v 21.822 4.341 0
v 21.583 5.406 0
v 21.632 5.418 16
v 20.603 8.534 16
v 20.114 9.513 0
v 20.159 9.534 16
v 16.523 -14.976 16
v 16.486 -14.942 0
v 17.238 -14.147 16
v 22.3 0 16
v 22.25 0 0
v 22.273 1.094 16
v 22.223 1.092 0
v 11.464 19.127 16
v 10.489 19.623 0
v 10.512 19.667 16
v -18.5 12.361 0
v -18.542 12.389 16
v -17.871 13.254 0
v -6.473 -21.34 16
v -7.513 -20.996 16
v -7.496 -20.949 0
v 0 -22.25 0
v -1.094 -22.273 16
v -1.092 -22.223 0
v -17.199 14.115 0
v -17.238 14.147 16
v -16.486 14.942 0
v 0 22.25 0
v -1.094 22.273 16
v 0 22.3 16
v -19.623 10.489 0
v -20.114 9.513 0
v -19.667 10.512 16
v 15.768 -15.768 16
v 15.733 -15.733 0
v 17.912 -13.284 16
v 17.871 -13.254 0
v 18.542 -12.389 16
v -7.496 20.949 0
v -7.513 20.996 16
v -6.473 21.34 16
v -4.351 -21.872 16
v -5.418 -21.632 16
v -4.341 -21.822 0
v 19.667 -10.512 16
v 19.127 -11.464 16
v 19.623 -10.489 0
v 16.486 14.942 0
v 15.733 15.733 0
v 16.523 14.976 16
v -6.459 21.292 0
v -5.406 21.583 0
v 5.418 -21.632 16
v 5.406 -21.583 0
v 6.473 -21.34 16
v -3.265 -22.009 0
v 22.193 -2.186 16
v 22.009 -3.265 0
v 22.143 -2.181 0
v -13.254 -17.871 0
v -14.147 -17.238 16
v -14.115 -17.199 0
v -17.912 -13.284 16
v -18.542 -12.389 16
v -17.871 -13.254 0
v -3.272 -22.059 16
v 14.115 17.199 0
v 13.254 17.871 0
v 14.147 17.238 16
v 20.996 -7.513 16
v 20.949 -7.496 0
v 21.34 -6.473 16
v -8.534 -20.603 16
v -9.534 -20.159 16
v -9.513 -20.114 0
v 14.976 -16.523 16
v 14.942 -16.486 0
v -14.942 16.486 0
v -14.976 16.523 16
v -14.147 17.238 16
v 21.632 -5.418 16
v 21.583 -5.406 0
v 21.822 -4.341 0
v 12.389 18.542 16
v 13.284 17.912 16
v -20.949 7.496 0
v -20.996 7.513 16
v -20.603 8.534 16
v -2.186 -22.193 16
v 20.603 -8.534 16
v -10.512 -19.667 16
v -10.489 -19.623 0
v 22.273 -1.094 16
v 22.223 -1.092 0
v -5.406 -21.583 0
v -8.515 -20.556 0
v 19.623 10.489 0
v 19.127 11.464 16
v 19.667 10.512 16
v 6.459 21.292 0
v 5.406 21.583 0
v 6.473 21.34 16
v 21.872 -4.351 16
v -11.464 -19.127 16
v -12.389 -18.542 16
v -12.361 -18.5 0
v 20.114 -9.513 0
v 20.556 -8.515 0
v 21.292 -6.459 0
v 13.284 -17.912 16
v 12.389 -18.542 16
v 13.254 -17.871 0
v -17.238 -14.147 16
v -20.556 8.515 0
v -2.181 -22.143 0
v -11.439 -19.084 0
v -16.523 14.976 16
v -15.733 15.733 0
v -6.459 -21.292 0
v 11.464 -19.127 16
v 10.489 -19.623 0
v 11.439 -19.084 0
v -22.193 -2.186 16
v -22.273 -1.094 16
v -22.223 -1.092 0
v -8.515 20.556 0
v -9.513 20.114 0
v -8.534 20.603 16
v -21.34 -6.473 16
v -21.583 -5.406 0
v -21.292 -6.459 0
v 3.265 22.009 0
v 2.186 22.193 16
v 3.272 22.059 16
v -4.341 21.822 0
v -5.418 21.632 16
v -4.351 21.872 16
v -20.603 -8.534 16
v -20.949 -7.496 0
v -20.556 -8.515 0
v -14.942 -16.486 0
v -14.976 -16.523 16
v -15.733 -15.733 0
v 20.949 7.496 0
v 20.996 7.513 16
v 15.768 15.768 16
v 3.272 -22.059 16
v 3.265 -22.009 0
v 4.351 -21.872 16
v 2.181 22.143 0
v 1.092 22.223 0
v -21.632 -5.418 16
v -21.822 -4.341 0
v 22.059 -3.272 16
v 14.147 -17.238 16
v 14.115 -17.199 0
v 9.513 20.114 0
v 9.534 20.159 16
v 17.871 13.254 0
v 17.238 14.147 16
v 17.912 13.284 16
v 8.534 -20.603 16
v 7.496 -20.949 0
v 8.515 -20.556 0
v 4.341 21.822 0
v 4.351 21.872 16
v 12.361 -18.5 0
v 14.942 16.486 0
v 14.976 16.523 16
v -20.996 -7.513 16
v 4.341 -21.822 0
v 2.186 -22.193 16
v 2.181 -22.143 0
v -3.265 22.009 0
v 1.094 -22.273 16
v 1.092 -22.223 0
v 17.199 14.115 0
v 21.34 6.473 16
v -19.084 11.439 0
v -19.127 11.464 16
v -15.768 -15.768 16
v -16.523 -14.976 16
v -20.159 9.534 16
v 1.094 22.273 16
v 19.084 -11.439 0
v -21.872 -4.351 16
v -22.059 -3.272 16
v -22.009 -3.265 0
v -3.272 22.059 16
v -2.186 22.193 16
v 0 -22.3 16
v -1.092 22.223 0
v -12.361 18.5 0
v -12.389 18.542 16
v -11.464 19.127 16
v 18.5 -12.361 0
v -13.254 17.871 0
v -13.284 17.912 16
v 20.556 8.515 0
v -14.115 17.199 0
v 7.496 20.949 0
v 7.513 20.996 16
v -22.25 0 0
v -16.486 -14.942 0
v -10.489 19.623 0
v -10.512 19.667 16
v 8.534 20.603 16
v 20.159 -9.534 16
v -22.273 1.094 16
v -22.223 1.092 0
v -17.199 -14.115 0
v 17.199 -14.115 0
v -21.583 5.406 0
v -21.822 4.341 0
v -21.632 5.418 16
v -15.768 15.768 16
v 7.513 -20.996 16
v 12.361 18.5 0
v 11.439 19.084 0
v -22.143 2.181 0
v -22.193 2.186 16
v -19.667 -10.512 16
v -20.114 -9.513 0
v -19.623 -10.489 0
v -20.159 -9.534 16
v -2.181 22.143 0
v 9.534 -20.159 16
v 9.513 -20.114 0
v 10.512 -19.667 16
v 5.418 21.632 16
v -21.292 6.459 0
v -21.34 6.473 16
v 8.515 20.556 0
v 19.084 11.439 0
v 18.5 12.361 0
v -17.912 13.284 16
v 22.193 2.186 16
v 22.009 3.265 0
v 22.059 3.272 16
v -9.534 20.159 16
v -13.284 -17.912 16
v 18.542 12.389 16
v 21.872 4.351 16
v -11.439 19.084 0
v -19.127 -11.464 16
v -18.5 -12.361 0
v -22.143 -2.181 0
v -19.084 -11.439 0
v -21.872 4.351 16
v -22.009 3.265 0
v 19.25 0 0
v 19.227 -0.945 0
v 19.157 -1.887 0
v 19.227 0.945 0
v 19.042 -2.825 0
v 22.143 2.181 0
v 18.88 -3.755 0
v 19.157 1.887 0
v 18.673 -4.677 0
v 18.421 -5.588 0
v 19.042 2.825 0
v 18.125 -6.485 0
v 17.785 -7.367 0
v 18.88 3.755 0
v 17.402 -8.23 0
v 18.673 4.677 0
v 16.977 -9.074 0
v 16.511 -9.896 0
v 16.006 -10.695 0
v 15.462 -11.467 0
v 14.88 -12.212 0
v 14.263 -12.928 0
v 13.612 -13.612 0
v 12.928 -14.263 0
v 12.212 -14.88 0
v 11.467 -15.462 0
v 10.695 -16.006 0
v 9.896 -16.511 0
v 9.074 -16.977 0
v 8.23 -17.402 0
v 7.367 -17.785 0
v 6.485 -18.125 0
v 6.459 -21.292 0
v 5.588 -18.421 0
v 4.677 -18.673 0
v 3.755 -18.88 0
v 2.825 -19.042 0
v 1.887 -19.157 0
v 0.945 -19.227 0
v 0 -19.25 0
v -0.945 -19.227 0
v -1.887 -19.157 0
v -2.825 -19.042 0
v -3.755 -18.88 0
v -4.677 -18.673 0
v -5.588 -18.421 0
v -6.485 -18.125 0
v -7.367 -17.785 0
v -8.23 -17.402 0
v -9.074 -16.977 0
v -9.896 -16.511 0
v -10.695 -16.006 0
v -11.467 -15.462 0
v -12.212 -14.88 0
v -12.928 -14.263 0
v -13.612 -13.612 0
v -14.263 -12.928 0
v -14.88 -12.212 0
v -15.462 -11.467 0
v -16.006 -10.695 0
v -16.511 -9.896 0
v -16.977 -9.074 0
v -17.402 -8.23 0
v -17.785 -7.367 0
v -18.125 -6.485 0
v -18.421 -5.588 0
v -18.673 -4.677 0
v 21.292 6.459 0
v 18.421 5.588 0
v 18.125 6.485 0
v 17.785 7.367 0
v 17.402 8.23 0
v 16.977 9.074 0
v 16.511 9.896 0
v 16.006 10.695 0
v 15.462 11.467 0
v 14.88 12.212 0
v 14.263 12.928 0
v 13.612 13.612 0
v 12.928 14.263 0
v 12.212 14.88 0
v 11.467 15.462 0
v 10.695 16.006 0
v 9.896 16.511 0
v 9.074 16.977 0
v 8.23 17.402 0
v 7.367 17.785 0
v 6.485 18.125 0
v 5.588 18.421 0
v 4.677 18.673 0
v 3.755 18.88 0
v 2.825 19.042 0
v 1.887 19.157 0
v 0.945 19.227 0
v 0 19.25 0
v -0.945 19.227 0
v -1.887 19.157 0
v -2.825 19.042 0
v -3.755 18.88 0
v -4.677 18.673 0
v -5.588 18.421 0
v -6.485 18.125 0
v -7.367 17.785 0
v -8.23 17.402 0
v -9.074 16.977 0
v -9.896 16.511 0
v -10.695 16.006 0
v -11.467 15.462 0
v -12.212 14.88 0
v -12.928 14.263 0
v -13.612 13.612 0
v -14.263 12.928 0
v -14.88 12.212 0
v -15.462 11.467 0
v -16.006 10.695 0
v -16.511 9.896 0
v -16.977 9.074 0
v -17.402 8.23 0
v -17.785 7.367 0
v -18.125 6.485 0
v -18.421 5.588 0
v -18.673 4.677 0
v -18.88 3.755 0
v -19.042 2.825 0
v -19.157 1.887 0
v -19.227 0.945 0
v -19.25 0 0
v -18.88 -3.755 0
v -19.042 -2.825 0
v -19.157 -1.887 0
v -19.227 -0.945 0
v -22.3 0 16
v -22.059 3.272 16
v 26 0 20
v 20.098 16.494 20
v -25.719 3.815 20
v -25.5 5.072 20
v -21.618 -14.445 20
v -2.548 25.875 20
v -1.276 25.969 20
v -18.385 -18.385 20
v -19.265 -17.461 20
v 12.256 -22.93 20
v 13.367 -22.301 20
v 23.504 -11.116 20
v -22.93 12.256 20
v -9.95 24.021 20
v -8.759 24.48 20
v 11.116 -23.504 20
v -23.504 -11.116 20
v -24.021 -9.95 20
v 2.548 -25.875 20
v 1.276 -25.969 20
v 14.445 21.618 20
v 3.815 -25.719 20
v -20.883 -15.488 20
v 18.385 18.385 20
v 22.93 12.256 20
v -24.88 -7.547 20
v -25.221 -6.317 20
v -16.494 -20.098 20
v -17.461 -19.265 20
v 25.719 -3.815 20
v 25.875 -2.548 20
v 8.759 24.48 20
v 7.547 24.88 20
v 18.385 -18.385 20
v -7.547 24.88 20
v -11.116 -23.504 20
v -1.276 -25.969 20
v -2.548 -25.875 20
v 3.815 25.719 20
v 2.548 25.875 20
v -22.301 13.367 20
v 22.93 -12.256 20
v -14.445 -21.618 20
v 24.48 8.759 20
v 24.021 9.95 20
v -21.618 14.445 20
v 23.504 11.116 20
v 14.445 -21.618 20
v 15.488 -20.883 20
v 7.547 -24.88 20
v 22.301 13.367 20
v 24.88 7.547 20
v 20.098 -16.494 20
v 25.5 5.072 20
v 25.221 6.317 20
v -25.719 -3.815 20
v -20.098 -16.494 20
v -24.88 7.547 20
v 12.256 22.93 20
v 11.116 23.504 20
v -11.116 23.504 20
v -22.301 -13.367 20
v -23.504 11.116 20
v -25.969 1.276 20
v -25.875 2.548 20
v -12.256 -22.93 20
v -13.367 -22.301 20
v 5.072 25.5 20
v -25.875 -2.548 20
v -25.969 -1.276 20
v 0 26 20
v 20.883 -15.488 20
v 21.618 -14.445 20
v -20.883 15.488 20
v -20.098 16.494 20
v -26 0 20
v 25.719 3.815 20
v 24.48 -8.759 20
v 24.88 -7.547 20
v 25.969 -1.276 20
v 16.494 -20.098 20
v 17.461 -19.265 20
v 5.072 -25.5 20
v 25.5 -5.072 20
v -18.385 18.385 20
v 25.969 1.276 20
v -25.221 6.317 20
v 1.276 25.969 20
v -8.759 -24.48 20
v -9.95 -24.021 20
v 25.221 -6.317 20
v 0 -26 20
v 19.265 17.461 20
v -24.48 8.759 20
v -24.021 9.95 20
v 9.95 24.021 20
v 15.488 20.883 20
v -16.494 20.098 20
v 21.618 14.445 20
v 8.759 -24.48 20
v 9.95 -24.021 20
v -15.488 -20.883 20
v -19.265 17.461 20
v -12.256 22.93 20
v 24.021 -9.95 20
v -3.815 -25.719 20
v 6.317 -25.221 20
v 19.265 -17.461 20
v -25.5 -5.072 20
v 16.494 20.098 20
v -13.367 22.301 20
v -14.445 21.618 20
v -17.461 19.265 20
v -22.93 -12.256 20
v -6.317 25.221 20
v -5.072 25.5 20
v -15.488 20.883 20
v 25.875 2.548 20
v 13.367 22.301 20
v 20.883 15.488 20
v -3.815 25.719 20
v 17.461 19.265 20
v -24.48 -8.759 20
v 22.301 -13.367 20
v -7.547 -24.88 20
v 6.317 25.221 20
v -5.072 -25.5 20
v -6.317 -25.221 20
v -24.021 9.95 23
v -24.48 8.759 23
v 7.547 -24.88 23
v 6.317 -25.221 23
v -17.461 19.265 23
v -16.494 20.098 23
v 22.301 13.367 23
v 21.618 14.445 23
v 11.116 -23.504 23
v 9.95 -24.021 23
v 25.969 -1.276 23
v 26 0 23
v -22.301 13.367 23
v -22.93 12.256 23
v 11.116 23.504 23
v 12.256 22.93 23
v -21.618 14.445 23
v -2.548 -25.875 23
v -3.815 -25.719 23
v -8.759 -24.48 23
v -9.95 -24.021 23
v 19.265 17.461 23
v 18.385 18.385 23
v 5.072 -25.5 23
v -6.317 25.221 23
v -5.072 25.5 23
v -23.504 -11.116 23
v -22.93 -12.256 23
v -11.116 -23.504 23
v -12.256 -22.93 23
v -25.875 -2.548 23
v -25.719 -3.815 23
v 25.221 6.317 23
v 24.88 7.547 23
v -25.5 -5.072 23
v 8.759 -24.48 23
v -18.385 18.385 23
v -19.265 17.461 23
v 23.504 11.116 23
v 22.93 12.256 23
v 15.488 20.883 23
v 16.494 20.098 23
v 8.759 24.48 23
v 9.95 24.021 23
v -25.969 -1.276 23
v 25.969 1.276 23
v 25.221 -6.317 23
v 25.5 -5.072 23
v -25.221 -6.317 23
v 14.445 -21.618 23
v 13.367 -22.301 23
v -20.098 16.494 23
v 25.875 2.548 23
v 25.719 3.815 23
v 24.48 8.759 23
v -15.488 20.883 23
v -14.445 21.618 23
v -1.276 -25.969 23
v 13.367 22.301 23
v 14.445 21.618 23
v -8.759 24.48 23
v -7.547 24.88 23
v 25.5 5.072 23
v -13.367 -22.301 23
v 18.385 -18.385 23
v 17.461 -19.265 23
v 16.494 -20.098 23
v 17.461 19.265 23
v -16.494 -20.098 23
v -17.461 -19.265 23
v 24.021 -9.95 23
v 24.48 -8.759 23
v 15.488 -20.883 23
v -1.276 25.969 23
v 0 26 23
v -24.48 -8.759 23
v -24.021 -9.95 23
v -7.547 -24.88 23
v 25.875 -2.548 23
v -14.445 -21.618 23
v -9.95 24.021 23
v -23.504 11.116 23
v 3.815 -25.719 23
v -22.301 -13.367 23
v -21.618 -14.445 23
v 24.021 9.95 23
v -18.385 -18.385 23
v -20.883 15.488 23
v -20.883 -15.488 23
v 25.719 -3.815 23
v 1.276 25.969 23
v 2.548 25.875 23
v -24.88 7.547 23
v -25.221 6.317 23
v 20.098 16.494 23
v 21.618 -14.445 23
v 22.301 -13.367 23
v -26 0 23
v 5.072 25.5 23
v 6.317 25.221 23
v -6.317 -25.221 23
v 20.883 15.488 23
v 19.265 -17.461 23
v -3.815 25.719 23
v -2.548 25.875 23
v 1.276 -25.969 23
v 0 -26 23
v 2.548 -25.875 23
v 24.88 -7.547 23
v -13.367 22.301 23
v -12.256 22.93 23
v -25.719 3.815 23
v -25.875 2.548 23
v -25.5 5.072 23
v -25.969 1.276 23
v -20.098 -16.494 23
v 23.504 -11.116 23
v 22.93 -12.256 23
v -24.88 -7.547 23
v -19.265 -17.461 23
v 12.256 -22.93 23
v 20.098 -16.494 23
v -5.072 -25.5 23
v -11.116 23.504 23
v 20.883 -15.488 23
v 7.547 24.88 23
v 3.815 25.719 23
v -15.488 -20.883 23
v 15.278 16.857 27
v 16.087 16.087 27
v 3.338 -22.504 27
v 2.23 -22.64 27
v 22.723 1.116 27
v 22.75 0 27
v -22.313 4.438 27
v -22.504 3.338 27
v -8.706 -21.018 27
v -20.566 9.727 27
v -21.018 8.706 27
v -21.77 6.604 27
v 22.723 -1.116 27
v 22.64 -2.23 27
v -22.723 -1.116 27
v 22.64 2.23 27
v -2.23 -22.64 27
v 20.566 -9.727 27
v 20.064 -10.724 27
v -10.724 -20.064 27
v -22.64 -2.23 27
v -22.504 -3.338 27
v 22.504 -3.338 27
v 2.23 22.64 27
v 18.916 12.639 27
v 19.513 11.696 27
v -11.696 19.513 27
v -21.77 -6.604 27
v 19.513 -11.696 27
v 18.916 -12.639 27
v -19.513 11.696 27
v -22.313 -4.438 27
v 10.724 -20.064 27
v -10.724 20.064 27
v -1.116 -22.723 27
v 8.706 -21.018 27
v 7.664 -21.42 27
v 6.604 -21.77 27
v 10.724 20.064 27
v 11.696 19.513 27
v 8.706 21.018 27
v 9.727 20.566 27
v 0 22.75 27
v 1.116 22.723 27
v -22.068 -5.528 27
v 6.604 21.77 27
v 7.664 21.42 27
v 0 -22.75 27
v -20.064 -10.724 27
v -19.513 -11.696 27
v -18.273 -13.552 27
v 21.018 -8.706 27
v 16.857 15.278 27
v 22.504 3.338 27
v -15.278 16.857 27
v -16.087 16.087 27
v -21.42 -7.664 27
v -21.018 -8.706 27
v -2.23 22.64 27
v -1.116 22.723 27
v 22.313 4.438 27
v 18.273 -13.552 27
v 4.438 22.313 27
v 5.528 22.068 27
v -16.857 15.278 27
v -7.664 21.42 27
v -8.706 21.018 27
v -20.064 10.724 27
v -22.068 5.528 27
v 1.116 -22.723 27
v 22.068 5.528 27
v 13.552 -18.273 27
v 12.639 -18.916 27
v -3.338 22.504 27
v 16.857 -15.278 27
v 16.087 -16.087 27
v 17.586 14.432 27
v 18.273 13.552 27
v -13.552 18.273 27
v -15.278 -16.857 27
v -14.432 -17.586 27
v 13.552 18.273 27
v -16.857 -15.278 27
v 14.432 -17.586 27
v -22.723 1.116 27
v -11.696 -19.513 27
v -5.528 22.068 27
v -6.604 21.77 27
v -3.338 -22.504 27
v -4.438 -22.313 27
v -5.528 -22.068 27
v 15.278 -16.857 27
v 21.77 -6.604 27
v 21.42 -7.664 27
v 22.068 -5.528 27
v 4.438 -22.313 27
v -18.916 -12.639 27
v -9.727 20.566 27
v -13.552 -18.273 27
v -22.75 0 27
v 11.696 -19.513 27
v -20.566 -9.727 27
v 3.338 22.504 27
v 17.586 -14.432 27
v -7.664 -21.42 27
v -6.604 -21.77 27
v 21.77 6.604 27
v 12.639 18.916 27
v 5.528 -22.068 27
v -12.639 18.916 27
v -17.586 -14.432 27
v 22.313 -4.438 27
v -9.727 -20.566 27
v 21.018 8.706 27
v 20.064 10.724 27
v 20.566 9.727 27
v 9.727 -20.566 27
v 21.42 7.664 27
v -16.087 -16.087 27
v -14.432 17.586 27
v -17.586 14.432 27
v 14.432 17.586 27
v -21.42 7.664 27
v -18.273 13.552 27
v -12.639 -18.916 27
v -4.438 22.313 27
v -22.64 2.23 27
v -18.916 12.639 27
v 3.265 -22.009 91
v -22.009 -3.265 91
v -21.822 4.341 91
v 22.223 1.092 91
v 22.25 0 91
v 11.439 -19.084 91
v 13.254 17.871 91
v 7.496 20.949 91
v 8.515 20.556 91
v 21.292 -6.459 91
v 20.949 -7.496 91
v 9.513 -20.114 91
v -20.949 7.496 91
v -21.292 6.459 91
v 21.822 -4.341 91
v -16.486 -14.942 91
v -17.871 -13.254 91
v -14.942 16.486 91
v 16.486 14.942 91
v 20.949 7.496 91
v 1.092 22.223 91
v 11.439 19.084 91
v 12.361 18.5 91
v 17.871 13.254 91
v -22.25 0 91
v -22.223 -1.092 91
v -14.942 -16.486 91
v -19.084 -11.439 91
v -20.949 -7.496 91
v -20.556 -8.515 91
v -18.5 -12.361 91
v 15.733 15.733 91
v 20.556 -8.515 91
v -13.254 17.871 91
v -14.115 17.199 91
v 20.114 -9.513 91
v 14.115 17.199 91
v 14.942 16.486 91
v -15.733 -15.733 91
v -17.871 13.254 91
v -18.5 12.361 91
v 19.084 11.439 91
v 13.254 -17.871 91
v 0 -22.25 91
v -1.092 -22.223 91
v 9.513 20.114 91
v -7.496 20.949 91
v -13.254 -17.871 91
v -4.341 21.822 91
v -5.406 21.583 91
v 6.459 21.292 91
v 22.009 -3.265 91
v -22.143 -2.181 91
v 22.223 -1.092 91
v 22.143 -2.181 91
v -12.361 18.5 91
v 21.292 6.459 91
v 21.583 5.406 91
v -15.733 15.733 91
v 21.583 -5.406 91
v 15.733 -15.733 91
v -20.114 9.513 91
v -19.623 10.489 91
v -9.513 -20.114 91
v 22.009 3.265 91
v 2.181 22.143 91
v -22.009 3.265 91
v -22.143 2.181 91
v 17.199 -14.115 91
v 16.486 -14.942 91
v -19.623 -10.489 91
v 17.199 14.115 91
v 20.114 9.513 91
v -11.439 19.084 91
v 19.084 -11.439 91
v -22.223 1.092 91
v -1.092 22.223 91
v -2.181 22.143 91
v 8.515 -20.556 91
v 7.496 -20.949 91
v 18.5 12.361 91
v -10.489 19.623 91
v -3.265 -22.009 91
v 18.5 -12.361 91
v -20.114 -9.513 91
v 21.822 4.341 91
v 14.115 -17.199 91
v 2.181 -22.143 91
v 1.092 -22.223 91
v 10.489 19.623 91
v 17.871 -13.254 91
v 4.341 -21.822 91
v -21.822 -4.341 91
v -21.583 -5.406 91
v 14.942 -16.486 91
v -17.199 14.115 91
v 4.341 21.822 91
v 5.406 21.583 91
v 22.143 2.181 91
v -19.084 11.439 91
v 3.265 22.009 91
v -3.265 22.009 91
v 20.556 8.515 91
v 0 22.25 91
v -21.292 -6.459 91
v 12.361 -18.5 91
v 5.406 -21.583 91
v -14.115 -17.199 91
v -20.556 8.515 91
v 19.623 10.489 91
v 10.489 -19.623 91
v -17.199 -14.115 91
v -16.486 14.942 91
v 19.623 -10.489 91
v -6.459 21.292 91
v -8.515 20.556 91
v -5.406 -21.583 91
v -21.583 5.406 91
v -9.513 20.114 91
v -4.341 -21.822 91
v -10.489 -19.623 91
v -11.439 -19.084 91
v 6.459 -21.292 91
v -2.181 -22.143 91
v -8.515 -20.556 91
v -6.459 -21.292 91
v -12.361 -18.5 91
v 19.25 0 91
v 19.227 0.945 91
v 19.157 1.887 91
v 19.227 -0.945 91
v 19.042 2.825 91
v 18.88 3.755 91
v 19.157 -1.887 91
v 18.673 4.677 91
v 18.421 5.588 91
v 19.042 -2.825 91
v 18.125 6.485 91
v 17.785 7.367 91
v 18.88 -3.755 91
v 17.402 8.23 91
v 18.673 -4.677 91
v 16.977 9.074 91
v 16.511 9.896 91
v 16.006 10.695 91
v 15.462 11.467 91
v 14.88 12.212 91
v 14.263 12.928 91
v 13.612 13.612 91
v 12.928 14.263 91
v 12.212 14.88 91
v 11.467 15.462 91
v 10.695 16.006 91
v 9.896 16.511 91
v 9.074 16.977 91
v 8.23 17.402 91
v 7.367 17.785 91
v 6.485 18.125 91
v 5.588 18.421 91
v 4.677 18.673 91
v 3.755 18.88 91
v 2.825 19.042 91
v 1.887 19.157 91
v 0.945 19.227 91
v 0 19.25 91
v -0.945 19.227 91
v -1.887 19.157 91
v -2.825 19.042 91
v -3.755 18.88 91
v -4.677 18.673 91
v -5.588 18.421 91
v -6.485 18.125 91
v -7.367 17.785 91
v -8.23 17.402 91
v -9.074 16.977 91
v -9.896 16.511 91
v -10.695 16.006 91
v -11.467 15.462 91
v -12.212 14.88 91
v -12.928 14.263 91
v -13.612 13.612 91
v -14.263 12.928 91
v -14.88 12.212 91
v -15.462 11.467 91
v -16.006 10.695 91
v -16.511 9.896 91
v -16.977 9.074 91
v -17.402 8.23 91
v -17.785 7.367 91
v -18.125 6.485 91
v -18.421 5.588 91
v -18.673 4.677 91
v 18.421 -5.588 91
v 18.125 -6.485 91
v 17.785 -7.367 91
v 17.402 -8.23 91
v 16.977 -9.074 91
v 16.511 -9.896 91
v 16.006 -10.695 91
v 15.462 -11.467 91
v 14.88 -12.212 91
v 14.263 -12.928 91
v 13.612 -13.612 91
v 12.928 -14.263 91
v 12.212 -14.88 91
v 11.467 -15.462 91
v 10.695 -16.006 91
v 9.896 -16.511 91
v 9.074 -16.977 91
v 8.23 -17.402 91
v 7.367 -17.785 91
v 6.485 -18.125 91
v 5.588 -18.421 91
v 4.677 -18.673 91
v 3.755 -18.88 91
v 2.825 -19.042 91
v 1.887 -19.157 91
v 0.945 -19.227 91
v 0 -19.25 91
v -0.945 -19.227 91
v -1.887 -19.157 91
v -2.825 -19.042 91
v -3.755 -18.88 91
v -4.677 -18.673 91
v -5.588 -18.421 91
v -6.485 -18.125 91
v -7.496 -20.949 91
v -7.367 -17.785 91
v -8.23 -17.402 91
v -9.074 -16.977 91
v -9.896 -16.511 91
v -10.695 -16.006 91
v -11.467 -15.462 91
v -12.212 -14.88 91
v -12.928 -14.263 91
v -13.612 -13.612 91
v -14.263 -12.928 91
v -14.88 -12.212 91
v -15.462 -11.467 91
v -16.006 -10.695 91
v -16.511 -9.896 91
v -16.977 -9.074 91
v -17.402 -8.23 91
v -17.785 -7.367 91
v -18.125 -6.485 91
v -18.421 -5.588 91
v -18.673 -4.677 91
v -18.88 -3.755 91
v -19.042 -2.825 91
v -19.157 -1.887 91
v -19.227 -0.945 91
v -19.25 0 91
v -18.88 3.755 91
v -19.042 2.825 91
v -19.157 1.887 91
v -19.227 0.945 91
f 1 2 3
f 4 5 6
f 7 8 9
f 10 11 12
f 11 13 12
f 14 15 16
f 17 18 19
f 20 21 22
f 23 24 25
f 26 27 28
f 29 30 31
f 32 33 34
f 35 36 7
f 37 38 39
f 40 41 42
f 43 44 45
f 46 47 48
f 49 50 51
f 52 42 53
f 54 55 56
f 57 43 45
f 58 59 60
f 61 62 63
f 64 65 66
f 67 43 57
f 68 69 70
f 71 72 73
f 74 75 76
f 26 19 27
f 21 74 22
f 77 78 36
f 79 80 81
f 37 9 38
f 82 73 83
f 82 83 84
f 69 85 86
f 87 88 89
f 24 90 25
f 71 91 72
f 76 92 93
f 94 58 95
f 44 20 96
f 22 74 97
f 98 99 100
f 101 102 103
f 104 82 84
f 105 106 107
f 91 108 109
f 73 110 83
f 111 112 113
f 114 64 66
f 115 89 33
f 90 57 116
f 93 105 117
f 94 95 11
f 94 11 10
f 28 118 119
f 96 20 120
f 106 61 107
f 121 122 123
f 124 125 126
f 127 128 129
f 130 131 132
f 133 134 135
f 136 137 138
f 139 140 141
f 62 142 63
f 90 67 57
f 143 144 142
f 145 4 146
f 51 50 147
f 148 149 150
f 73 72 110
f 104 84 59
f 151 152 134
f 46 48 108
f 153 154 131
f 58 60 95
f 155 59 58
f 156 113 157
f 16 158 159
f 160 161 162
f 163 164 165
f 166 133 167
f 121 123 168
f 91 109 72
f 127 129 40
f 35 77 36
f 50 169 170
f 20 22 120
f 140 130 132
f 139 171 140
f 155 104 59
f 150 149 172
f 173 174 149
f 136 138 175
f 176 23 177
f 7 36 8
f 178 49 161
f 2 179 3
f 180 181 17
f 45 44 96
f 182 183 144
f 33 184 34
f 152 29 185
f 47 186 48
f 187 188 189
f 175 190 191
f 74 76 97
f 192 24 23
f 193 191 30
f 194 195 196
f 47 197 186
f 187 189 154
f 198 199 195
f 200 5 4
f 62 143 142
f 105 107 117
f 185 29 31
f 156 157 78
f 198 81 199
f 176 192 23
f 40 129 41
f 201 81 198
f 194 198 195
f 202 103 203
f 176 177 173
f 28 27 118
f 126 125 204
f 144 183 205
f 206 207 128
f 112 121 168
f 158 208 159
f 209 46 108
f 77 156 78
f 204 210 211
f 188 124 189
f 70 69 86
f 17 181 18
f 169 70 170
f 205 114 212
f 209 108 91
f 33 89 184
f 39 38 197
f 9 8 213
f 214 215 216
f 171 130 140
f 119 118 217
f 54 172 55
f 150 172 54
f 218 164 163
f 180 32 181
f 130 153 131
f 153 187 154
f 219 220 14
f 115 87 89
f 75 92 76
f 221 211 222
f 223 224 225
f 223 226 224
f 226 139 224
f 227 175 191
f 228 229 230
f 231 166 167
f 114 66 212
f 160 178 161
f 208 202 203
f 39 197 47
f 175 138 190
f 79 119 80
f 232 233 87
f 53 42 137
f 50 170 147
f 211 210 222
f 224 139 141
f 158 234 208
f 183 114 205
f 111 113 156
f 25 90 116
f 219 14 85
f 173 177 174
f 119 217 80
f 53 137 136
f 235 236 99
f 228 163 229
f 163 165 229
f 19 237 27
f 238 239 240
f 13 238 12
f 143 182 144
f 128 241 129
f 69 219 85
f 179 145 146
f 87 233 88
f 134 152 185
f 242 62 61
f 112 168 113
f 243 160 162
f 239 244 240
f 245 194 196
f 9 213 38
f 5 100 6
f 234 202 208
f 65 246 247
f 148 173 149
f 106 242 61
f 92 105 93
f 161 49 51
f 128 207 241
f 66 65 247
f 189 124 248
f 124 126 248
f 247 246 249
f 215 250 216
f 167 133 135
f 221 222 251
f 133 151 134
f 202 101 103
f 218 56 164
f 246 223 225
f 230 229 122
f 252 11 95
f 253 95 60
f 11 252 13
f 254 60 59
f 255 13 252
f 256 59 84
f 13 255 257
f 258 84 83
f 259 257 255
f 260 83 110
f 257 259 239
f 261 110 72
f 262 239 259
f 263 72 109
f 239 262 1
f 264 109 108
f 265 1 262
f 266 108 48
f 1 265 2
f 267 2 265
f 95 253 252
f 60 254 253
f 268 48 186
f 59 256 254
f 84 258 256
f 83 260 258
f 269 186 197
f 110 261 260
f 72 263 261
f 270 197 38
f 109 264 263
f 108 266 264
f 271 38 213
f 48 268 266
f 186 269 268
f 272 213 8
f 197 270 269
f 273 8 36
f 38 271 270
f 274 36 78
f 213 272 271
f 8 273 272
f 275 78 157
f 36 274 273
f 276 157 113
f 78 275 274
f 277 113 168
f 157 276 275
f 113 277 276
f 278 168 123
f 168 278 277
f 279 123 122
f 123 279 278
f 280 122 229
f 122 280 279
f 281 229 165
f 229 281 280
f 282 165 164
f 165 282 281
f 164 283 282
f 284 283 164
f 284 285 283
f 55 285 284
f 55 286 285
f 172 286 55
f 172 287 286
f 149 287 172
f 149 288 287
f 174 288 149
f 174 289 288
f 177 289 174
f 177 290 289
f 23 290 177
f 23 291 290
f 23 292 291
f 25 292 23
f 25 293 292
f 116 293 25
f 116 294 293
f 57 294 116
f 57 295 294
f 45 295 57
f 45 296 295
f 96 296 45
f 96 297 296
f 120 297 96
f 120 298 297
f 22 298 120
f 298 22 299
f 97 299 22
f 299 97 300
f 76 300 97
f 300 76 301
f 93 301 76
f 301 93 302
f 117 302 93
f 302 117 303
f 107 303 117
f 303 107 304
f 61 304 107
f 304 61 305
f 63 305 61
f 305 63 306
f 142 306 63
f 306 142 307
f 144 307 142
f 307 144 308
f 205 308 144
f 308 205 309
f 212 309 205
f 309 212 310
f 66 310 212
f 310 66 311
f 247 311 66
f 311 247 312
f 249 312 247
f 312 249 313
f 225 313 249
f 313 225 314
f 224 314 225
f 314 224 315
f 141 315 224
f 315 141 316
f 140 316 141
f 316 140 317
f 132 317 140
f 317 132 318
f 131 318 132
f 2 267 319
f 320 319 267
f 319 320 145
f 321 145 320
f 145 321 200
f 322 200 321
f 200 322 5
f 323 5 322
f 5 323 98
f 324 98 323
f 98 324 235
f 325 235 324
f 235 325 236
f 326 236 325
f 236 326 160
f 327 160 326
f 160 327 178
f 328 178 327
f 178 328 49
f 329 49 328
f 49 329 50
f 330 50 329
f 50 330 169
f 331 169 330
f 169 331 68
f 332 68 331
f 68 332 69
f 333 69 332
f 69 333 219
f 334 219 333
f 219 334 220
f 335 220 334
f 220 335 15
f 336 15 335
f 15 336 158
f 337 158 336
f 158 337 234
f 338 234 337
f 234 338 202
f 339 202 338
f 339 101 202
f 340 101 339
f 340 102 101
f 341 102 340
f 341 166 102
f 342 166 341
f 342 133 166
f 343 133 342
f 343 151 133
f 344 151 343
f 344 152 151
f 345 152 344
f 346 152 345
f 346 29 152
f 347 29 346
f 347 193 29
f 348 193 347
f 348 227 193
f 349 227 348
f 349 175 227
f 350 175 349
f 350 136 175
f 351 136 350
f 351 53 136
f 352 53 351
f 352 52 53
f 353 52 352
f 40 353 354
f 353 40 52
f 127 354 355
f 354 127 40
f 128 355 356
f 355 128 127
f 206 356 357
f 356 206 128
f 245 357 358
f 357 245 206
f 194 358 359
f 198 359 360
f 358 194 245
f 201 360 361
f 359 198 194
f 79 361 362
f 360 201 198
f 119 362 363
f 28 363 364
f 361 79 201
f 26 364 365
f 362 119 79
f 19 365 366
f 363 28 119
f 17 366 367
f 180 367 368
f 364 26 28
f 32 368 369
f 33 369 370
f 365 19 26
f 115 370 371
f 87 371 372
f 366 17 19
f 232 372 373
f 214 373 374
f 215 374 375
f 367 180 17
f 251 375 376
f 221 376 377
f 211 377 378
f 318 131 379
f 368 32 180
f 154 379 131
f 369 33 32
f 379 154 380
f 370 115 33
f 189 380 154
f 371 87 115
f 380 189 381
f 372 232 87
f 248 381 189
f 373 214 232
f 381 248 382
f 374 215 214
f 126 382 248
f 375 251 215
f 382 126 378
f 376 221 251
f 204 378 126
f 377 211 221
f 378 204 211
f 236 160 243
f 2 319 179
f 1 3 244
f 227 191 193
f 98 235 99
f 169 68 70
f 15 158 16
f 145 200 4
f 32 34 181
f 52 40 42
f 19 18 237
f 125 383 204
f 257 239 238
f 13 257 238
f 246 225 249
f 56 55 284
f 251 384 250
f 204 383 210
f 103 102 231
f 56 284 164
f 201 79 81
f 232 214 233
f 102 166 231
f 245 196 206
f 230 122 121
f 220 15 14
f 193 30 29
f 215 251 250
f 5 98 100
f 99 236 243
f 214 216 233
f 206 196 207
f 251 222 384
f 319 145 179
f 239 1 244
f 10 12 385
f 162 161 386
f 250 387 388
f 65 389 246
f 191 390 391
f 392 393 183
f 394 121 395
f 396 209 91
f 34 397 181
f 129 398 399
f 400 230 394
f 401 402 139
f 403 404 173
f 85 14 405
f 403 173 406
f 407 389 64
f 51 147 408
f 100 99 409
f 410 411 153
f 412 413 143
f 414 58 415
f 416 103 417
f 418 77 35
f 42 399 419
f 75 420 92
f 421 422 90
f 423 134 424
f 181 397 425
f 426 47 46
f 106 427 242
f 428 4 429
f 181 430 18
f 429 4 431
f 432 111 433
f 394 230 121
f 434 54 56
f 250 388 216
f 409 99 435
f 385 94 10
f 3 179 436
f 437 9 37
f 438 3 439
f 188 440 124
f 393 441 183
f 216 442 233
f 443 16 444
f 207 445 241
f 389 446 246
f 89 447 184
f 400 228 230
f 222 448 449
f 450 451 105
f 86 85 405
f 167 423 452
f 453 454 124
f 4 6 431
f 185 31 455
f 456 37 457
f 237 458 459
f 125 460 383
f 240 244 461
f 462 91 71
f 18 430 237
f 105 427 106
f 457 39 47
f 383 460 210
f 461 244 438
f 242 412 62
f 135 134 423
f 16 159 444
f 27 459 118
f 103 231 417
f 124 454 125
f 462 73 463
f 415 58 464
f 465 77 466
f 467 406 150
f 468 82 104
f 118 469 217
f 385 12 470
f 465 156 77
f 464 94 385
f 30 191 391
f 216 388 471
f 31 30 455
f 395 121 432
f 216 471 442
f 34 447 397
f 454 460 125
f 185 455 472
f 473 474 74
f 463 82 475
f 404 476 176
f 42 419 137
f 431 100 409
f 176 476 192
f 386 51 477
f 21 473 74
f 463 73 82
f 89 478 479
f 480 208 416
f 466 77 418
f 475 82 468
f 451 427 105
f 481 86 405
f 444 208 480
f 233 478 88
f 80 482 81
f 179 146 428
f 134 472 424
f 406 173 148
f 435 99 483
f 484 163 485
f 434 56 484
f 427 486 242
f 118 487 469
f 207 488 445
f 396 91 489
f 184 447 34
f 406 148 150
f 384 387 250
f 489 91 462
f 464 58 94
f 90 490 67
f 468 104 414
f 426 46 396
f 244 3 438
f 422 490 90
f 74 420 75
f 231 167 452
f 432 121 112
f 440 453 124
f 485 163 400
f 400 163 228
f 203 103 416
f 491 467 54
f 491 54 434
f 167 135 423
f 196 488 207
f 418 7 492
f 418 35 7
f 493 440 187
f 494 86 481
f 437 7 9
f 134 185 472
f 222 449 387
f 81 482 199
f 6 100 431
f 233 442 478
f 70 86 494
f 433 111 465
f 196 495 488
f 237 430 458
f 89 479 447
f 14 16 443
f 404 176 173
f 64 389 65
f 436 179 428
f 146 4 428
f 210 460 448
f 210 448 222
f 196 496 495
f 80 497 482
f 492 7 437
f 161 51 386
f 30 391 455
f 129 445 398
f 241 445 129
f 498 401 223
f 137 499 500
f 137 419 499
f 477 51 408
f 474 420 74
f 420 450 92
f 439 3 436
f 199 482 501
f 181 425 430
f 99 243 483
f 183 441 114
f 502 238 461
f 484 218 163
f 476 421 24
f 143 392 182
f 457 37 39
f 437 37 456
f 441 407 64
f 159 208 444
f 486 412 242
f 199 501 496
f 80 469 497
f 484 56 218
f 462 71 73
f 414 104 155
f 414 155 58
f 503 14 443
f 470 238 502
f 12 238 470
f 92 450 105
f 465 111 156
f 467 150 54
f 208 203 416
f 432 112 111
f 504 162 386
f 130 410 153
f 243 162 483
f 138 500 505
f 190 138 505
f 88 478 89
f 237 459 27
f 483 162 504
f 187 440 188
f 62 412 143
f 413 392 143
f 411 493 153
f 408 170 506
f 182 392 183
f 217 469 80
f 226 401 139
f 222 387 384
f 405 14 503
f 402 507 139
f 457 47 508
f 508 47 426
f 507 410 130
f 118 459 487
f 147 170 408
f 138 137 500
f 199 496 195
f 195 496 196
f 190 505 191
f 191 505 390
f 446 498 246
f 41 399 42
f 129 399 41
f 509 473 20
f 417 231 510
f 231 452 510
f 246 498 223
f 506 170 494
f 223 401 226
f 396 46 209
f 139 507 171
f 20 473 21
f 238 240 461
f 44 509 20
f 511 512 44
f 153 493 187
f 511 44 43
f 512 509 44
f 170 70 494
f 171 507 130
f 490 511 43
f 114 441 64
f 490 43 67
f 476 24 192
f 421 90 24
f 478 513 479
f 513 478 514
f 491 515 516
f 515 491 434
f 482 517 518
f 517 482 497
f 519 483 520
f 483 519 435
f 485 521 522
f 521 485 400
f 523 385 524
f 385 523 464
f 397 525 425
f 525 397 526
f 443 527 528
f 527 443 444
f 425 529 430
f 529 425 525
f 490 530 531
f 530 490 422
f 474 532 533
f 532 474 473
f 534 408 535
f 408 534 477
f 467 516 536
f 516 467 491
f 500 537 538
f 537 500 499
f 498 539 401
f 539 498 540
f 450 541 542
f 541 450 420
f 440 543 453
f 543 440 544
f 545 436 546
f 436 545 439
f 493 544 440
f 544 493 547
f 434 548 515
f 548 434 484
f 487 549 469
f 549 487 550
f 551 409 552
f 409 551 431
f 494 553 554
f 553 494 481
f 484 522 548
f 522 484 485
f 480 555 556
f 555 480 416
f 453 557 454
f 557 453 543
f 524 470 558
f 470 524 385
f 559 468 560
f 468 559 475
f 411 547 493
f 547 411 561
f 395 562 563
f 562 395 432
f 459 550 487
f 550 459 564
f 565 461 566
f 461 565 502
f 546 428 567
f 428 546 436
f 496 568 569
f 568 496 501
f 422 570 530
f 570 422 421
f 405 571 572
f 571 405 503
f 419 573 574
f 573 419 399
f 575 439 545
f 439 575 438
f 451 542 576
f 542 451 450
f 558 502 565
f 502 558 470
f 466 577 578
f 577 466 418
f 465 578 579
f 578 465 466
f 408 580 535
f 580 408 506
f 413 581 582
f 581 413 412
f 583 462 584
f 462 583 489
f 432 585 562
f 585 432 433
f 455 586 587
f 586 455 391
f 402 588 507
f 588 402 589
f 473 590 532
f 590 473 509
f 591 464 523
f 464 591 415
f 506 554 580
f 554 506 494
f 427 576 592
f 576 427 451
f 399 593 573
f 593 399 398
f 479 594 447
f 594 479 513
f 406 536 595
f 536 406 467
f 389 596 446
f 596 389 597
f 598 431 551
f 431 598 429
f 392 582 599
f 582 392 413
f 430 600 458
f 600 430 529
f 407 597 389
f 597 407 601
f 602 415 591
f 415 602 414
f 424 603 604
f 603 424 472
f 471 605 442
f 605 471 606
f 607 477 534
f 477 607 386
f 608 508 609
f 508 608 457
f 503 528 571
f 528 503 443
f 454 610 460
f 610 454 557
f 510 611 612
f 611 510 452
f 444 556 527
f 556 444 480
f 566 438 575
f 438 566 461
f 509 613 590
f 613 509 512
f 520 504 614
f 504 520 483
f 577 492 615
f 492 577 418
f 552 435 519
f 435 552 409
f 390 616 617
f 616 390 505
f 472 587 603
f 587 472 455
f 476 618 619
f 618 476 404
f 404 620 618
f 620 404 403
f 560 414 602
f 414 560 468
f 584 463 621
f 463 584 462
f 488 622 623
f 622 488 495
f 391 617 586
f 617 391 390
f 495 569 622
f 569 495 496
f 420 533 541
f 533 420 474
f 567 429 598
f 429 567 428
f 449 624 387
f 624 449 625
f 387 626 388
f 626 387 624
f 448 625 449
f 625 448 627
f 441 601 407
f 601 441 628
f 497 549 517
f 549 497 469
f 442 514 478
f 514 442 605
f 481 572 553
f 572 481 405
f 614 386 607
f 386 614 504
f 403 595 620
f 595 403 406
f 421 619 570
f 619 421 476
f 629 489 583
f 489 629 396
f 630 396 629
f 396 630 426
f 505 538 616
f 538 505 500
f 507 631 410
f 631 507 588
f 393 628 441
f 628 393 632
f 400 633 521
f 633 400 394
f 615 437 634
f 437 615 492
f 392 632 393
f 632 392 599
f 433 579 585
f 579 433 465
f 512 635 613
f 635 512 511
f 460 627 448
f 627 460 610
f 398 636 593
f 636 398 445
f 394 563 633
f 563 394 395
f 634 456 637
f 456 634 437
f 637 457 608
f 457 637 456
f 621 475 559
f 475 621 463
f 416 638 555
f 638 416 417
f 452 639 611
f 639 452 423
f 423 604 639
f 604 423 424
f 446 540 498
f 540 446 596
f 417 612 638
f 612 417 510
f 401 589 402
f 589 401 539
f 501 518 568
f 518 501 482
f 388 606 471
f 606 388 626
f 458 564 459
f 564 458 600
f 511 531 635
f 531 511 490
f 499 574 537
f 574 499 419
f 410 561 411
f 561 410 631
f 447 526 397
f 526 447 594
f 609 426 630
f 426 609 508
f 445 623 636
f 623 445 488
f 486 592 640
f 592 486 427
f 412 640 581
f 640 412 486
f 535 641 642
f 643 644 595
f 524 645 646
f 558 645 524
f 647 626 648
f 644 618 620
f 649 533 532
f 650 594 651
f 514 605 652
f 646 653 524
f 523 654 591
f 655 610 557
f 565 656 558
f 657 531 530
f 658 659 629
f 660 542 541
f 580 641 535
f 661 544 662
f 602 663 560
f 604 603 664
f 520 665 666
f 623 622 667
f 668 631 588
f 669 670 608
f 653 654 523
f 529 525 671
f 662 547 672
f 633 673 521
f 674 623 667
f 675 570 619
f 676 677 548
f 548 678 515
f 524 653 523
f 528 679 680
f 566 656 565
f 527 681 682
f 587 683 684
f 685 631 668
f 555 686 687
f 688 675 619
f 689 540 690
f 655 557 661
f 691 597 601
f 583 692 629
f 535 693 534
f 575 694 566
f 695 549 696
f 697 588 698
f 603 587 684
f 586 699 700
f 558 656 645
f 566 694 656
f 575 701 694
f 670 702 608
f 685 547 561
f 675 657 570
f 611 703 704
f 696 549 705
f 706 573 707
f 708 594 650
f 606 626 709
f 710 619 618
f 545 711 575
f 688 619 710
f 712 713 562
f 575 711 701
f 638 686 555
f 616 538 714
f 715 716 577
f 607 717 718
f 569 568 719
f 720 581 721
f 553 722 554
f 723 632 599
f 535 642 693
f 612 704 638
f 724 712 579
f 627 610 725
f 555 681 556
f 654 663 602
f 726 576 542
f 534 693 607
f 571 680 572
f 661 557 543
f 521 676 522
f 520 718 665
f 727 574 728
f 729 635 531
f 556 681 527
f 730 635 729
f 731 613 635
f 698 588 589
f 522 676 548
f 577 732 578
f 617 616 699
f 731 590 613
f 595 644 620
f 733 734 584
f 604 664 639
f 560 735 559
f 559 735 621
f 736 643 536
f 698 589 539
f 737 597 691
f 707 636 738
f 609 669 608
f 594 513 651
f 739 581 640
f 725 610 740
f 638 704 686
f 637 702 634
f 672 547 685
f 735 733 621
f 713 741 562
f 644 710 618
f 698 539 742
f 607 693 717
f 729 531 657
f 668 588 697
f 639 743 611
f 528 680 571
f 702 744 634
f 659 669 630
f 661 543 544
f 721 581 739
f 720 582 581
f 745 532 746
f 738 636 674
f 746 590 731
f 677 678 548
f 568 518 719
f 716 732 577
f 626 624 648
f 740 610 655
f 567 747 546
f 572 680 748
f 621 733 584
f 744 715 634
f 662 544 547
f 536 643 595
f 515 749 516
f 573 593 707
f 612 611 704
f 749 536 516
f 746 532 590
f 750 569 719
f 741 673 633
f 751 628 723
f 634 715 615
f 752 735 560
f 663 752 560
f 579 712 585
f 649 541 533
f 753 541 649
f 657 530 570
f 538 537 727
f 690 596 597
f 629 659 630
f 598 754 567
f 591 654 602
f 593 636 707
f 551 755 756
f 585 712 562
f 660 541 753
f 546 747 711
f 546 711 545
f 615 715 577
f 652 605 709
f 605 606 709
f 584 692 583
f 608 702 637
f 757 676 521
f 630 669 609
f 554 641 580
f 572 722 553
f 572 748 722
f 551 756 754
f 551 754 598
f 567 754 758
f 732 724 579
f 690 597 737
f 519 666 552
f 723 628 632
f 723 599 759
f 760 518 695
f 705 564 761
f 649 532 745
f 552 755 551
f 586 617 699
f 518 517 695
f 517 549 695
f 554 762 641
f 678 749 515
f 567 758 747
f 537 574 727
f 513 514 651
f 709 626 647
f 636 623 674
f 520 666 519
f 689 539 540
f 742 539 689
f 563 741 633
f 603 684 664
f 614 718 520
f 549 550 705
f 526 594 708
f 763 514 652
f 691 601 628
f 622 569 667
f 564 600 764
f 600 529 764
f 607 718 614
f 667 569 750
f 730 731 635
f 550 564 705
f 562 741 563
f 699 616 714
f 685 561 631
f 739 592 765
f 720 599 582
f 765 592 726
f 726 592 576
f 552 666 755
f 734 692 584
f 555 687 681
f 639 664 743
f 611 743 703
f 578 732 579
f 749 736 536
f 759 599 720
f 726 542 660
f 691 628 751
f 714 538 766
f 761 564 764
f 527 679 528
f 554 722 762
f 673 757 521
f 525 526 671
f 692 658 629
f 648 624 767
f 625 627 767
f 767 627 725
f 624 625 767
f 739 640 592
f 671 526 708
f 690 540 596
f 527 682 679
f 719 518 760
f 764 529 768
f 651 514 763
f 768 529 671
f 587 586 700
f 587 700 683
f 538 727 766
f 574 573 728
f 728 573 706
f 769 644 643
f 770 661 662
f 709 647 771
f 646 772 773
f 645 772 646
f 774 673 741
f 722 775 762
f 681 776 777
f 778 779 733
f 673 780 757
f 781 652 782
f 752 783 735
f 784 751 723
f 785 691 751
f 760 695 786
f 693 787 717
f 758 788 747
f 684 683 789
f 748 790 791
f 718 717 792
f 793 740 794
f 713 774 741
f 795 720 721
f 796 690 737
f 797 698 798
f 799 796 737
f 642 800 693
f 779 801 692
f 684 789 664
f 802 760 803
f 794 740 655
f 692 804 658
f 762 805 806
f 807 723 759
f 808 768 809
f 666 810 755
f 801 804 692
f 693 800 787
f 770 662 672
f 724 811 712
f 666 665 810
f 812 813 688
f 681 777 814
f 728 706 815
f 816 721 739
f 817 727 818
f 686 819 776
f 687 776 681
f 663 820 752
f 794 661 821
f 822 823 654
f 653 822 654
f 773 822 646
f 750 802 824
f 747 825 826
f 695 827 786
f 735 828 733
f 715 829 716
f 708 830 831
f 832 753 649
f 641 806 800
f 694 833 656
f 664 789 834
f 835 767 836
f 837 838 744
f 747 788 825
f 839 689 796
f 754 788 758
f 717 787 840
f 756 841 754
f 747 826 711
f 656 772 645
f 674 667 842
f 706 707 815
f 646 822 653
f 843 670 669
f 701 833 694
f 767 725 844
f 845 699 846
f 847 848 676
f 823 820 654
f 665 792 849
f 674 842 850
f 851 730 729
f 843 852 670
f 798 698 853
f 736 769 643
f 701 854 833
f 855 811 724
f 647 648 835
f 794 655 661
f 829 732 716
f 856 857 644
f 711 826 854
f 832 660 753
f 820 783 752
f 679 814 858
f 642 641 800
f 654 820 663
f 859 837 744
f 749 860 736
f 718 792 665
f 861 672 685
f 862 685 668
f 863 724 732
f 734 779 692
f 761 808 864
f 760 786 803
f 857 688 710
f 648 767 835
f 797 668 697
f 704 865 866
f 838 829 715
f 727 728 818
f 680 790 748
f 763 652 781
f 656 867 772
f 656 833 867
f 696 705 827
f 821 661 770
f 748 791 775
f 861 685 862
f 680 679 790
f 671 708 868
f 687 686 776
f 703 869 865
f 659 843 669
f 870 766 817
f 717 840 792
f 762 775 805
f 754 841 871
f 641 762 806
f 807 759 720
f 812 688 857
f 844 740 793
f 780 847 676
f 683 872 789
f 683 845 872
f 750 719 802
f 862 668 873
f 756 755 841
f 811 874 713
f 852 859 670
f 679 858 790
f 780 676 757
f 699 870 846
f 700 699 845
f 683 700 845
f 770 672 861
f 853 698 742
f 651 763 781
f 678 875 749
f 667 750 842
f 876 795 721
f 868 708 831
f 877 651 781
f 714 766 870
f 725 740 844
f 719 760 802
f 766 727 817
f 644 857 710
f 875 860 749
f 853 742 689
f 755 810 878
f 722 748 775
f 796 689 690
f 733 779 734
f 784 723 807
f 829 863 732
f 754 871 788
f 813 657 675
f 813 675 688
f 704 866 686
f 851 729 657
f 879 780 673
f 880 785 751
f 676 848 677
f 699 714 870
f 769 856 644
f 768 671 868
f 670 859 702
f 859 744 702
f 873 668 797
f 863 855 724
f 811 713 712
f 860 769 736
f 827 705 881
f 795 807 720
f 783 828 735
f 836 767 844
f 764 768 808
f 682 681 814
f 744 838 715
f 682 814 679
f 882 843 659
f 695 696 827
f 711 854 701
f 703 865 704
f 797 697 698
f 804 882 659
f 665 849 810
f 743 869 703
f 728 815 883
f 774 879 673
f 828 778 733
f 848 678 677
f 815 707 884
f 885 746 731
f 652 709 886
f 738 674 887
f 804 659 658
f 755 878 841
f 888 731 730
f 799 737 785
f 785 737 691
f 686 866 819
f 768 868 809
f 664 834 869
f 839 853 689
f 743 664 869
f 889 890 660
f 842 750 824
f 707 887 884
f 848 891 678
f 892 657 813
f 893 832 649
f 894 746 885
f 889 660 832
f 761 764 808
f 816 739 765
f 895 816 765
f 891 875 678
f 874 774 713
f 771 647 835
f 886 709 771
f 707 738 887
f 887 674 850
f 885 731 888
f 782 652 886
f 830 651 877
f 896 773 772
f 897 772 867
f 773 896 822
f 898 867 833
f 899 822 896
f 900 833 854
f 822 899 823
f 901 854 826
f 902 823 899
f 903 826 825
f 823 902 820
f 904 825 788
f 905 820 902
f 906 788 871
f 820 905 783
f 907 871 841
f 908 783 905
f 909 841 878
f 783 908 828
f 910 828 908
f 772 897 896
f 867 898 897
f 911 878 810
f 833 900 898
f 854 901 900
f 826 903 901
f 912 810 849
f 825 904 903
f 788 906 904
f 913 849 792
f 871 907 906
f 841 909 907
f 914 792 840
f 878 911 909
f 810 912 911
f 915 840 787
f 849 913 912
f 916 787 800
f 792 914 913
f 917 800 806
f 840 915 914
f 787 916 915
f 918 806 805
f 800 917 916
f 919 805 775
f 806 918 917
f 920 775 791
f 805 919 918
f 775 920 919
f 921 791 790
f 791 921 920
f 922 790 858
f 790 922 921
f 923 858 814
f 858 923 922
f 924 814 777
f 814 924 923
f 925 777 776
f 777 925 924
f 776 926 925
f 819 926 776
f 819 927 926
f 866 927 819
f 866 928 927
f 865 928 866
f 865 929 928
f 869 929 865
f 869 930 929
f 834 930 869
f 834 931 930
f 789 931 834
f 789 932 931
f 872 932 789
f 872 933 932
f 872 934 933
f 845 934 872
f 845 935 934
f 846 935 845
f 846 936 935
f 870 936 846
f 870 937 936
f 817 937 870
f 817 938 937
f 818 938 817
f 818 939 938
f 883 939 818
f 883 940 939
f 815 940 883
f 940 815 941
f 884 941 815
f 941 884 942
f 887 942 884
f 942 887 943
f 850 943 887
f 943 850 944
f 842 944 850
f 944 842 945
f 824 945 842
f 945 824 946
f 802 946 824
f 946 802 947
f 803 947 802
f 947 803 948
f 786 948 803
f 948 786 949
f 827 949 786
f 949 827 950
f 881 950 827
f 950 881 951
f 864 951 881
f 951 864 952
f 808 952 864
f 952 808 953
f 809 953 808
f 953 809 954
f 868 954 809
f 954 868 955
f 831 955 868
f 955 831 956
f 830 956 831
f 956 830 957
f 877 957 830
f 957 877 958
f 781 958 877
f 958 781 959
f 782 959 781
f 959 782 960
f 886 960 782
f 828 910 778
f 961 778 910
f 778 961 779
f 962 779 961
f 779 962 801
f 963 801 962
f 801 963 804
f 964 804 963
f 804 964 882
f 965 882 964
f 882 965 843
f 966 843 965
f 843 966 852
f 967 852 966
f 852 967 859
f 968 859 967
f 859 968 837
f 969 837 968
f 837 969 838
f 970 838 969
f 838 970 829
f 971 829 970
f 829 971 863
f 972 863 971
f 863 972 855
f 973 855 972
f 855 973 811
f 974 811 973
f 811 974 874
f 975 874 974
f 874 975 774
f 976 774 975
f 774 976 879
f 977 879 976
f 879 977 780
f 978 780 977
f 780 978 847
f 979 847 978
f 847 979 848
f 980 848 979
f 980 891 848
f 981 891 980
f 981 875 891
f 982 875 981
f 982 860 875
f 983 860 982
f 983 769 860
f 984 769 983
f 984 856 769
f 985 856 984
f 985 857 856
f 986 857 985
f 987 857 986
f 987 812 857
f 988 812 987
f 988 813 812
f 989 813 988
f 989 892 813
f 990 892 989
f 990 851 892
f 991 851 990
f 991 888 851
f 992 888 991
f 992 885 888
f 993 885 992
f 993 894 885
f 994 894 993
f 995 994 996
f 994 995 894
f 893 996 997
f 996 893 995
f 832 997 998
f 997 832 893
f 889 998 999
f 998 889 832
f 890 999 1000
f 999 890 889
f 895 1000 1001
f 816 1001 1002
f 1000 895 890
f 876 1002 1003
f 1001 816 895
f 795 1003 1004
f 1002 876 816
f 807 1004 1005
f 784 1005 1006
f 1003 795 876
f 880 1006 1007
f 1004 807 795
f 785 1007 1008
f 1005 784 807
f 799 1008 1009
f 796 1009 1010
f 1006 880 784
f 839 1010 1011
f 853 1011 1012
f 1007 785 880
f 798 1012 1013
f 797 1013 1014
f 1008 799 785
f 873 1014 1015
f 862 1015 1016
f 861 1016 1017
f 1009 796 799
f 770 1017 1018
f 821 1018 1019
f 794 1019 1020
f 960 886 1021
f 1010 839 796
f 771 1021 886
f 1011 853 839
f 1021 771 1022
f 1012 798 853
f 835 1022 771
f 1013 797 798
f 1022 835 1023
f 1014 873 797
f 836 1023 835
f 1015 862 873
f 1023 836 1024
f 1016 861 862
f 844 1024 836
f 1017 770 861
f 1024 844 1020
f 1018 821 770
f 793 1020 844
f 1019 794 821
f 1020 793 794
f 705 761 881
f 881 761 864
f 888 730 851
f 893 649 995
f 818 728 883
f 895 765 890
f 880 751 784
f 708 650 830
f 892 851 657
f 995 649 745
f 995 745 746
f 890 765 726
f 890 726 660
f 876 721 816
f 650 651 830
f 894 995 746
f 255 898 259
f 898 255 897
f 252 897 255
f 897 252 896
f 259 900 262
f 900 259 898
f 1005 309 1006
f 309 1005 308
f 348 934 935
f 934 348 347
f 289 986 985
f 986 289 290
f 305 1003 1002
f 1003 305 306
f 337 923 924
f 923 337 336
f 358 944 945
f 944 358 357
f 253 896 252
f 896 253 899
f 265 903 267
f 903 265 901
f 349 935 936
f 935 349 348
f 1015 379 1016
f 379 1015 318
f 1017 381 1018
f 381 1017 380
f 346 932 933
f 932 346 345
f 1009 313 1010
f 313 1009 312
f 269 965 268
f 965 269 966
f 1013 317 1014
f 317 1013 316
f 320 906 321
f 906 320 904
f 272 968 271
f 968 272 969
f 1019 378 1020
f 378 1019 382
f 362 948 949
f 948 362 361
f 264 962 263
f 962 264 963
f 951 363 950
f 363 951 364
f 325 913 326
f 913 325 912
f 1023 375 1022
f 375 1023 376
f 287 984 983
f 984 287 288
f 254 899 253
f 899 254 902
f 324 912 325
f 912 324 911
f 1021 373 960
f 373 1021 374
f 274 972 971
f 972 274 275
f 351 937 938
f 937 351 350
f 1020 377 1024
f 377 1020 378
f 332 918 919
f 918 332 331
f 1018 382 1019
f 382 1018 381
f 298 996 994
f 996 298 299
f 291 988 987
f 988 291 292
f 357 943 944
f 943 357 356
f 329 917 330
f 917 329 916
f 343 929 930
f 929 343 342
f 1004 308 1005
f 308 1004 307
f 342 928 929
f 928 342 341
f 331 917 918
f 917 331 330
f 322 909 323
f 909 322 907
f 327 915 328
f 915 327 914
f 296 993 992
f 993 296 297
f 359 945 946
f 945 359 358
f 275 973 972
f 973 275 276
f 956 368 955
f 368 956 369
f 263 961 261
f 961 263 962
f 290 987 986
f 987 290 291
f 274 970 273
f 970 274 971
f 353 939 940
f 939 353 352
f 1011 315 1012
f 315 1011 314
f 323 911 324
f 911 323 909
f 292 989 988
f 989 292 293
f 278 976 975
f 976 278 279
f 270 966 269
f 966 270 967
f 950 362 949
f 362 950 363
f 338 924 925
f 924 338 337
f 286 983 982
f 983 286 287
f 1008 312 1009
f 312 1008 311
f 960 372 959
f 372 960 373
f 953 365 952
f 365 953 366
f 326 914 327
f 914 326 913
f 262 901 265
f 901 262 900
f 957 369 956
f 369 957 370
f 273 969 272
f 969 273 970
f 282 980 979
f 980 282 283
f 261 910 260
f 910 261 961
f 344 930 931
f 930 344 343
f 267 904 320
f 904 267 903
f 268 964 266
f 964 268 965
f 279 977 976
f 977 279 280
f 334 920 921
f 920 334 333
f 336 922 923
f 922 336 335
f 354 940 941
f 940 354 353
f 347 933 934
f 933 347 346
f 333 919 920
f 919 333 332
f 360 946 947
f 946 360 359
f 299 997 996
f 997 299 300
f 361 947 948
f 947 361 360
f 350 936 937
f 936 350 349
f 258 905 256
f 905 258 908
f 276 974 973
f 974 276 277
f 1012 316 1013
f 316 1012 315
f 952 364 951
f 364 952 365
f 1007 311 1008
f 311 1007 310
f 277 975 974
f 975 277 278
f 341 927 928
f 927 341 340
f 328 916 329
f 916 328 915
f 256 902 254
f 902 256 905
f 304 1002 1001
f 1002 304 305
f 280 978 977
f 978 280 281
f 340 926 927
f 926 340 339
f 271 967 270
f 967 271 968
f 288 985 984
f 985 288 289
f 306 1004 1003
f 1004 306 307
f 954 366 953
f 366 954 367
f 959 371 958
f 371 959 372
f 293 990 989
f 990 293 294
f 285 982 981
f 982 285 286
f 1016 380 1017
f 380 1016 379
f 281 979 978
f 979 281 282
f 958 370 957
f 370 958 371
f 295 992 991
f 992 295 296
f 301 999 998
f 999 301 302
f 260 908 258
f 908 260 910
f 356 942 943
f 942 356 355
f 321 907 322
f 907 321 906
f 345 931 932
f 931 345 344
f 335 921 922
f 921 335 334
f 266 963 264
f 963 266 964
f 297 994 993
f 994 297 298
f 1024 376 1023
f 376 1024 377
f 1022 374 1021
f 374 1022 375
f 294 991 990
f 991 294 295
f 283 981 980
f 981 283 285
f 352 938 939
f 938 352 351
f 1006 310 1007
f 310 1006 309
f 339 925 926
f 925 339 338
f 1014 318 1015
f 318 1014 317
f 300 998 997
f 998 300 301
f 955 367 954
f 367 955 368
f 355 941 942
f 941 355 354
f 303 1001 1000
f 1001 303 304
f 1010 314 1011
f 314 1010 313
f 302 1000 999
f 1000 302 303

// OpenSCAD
$fn=128;

thickness=3;

difference() {
  union() {
    cylinder(h=16, d1=44.5, d2=44.6);
    translate([0, 0, 16]) cylinder(h=4, d1=44.6, d2=52);
    // Create a 45 deg overhang for printing.
    translate([0, 0, 20]) cylinder(h=3, d=52);
    translate([0, 0, 23]) cylinder(h=4, d1=52, d2=45.5);
    translate([0, 0, 27]) cylinder(h=64, d1=45.5, d2=44.5);
  }
  cylinder(h=91, d1=44.5-thickness*2, d2=44.5-thickness*2);
}


//thickness=2;
//
//difference() {
//  union() {
//    cylinder(h=16, d1=44.5, d2=44.6);
//    translate([0, 0, 16]) cylinder(h=2, d1=44.6, d2=48.6);
//    // Create a 45 deg overhang for printing.
//    translate([0, 0, 18]) cylinder(h=2, d=48.6);
//    translate([0, 0, 20]) cylinder(h=1.5, d1=48.6, d2=45.5);
//    translate([0, 0, 21.5]) cylinder(h=64, d1=45.5, d2=44.5);
//  }
//  cylinder(h=64+21.5, d1=44.5-thickness*2, d2=44.5-thickness*2);
//}
